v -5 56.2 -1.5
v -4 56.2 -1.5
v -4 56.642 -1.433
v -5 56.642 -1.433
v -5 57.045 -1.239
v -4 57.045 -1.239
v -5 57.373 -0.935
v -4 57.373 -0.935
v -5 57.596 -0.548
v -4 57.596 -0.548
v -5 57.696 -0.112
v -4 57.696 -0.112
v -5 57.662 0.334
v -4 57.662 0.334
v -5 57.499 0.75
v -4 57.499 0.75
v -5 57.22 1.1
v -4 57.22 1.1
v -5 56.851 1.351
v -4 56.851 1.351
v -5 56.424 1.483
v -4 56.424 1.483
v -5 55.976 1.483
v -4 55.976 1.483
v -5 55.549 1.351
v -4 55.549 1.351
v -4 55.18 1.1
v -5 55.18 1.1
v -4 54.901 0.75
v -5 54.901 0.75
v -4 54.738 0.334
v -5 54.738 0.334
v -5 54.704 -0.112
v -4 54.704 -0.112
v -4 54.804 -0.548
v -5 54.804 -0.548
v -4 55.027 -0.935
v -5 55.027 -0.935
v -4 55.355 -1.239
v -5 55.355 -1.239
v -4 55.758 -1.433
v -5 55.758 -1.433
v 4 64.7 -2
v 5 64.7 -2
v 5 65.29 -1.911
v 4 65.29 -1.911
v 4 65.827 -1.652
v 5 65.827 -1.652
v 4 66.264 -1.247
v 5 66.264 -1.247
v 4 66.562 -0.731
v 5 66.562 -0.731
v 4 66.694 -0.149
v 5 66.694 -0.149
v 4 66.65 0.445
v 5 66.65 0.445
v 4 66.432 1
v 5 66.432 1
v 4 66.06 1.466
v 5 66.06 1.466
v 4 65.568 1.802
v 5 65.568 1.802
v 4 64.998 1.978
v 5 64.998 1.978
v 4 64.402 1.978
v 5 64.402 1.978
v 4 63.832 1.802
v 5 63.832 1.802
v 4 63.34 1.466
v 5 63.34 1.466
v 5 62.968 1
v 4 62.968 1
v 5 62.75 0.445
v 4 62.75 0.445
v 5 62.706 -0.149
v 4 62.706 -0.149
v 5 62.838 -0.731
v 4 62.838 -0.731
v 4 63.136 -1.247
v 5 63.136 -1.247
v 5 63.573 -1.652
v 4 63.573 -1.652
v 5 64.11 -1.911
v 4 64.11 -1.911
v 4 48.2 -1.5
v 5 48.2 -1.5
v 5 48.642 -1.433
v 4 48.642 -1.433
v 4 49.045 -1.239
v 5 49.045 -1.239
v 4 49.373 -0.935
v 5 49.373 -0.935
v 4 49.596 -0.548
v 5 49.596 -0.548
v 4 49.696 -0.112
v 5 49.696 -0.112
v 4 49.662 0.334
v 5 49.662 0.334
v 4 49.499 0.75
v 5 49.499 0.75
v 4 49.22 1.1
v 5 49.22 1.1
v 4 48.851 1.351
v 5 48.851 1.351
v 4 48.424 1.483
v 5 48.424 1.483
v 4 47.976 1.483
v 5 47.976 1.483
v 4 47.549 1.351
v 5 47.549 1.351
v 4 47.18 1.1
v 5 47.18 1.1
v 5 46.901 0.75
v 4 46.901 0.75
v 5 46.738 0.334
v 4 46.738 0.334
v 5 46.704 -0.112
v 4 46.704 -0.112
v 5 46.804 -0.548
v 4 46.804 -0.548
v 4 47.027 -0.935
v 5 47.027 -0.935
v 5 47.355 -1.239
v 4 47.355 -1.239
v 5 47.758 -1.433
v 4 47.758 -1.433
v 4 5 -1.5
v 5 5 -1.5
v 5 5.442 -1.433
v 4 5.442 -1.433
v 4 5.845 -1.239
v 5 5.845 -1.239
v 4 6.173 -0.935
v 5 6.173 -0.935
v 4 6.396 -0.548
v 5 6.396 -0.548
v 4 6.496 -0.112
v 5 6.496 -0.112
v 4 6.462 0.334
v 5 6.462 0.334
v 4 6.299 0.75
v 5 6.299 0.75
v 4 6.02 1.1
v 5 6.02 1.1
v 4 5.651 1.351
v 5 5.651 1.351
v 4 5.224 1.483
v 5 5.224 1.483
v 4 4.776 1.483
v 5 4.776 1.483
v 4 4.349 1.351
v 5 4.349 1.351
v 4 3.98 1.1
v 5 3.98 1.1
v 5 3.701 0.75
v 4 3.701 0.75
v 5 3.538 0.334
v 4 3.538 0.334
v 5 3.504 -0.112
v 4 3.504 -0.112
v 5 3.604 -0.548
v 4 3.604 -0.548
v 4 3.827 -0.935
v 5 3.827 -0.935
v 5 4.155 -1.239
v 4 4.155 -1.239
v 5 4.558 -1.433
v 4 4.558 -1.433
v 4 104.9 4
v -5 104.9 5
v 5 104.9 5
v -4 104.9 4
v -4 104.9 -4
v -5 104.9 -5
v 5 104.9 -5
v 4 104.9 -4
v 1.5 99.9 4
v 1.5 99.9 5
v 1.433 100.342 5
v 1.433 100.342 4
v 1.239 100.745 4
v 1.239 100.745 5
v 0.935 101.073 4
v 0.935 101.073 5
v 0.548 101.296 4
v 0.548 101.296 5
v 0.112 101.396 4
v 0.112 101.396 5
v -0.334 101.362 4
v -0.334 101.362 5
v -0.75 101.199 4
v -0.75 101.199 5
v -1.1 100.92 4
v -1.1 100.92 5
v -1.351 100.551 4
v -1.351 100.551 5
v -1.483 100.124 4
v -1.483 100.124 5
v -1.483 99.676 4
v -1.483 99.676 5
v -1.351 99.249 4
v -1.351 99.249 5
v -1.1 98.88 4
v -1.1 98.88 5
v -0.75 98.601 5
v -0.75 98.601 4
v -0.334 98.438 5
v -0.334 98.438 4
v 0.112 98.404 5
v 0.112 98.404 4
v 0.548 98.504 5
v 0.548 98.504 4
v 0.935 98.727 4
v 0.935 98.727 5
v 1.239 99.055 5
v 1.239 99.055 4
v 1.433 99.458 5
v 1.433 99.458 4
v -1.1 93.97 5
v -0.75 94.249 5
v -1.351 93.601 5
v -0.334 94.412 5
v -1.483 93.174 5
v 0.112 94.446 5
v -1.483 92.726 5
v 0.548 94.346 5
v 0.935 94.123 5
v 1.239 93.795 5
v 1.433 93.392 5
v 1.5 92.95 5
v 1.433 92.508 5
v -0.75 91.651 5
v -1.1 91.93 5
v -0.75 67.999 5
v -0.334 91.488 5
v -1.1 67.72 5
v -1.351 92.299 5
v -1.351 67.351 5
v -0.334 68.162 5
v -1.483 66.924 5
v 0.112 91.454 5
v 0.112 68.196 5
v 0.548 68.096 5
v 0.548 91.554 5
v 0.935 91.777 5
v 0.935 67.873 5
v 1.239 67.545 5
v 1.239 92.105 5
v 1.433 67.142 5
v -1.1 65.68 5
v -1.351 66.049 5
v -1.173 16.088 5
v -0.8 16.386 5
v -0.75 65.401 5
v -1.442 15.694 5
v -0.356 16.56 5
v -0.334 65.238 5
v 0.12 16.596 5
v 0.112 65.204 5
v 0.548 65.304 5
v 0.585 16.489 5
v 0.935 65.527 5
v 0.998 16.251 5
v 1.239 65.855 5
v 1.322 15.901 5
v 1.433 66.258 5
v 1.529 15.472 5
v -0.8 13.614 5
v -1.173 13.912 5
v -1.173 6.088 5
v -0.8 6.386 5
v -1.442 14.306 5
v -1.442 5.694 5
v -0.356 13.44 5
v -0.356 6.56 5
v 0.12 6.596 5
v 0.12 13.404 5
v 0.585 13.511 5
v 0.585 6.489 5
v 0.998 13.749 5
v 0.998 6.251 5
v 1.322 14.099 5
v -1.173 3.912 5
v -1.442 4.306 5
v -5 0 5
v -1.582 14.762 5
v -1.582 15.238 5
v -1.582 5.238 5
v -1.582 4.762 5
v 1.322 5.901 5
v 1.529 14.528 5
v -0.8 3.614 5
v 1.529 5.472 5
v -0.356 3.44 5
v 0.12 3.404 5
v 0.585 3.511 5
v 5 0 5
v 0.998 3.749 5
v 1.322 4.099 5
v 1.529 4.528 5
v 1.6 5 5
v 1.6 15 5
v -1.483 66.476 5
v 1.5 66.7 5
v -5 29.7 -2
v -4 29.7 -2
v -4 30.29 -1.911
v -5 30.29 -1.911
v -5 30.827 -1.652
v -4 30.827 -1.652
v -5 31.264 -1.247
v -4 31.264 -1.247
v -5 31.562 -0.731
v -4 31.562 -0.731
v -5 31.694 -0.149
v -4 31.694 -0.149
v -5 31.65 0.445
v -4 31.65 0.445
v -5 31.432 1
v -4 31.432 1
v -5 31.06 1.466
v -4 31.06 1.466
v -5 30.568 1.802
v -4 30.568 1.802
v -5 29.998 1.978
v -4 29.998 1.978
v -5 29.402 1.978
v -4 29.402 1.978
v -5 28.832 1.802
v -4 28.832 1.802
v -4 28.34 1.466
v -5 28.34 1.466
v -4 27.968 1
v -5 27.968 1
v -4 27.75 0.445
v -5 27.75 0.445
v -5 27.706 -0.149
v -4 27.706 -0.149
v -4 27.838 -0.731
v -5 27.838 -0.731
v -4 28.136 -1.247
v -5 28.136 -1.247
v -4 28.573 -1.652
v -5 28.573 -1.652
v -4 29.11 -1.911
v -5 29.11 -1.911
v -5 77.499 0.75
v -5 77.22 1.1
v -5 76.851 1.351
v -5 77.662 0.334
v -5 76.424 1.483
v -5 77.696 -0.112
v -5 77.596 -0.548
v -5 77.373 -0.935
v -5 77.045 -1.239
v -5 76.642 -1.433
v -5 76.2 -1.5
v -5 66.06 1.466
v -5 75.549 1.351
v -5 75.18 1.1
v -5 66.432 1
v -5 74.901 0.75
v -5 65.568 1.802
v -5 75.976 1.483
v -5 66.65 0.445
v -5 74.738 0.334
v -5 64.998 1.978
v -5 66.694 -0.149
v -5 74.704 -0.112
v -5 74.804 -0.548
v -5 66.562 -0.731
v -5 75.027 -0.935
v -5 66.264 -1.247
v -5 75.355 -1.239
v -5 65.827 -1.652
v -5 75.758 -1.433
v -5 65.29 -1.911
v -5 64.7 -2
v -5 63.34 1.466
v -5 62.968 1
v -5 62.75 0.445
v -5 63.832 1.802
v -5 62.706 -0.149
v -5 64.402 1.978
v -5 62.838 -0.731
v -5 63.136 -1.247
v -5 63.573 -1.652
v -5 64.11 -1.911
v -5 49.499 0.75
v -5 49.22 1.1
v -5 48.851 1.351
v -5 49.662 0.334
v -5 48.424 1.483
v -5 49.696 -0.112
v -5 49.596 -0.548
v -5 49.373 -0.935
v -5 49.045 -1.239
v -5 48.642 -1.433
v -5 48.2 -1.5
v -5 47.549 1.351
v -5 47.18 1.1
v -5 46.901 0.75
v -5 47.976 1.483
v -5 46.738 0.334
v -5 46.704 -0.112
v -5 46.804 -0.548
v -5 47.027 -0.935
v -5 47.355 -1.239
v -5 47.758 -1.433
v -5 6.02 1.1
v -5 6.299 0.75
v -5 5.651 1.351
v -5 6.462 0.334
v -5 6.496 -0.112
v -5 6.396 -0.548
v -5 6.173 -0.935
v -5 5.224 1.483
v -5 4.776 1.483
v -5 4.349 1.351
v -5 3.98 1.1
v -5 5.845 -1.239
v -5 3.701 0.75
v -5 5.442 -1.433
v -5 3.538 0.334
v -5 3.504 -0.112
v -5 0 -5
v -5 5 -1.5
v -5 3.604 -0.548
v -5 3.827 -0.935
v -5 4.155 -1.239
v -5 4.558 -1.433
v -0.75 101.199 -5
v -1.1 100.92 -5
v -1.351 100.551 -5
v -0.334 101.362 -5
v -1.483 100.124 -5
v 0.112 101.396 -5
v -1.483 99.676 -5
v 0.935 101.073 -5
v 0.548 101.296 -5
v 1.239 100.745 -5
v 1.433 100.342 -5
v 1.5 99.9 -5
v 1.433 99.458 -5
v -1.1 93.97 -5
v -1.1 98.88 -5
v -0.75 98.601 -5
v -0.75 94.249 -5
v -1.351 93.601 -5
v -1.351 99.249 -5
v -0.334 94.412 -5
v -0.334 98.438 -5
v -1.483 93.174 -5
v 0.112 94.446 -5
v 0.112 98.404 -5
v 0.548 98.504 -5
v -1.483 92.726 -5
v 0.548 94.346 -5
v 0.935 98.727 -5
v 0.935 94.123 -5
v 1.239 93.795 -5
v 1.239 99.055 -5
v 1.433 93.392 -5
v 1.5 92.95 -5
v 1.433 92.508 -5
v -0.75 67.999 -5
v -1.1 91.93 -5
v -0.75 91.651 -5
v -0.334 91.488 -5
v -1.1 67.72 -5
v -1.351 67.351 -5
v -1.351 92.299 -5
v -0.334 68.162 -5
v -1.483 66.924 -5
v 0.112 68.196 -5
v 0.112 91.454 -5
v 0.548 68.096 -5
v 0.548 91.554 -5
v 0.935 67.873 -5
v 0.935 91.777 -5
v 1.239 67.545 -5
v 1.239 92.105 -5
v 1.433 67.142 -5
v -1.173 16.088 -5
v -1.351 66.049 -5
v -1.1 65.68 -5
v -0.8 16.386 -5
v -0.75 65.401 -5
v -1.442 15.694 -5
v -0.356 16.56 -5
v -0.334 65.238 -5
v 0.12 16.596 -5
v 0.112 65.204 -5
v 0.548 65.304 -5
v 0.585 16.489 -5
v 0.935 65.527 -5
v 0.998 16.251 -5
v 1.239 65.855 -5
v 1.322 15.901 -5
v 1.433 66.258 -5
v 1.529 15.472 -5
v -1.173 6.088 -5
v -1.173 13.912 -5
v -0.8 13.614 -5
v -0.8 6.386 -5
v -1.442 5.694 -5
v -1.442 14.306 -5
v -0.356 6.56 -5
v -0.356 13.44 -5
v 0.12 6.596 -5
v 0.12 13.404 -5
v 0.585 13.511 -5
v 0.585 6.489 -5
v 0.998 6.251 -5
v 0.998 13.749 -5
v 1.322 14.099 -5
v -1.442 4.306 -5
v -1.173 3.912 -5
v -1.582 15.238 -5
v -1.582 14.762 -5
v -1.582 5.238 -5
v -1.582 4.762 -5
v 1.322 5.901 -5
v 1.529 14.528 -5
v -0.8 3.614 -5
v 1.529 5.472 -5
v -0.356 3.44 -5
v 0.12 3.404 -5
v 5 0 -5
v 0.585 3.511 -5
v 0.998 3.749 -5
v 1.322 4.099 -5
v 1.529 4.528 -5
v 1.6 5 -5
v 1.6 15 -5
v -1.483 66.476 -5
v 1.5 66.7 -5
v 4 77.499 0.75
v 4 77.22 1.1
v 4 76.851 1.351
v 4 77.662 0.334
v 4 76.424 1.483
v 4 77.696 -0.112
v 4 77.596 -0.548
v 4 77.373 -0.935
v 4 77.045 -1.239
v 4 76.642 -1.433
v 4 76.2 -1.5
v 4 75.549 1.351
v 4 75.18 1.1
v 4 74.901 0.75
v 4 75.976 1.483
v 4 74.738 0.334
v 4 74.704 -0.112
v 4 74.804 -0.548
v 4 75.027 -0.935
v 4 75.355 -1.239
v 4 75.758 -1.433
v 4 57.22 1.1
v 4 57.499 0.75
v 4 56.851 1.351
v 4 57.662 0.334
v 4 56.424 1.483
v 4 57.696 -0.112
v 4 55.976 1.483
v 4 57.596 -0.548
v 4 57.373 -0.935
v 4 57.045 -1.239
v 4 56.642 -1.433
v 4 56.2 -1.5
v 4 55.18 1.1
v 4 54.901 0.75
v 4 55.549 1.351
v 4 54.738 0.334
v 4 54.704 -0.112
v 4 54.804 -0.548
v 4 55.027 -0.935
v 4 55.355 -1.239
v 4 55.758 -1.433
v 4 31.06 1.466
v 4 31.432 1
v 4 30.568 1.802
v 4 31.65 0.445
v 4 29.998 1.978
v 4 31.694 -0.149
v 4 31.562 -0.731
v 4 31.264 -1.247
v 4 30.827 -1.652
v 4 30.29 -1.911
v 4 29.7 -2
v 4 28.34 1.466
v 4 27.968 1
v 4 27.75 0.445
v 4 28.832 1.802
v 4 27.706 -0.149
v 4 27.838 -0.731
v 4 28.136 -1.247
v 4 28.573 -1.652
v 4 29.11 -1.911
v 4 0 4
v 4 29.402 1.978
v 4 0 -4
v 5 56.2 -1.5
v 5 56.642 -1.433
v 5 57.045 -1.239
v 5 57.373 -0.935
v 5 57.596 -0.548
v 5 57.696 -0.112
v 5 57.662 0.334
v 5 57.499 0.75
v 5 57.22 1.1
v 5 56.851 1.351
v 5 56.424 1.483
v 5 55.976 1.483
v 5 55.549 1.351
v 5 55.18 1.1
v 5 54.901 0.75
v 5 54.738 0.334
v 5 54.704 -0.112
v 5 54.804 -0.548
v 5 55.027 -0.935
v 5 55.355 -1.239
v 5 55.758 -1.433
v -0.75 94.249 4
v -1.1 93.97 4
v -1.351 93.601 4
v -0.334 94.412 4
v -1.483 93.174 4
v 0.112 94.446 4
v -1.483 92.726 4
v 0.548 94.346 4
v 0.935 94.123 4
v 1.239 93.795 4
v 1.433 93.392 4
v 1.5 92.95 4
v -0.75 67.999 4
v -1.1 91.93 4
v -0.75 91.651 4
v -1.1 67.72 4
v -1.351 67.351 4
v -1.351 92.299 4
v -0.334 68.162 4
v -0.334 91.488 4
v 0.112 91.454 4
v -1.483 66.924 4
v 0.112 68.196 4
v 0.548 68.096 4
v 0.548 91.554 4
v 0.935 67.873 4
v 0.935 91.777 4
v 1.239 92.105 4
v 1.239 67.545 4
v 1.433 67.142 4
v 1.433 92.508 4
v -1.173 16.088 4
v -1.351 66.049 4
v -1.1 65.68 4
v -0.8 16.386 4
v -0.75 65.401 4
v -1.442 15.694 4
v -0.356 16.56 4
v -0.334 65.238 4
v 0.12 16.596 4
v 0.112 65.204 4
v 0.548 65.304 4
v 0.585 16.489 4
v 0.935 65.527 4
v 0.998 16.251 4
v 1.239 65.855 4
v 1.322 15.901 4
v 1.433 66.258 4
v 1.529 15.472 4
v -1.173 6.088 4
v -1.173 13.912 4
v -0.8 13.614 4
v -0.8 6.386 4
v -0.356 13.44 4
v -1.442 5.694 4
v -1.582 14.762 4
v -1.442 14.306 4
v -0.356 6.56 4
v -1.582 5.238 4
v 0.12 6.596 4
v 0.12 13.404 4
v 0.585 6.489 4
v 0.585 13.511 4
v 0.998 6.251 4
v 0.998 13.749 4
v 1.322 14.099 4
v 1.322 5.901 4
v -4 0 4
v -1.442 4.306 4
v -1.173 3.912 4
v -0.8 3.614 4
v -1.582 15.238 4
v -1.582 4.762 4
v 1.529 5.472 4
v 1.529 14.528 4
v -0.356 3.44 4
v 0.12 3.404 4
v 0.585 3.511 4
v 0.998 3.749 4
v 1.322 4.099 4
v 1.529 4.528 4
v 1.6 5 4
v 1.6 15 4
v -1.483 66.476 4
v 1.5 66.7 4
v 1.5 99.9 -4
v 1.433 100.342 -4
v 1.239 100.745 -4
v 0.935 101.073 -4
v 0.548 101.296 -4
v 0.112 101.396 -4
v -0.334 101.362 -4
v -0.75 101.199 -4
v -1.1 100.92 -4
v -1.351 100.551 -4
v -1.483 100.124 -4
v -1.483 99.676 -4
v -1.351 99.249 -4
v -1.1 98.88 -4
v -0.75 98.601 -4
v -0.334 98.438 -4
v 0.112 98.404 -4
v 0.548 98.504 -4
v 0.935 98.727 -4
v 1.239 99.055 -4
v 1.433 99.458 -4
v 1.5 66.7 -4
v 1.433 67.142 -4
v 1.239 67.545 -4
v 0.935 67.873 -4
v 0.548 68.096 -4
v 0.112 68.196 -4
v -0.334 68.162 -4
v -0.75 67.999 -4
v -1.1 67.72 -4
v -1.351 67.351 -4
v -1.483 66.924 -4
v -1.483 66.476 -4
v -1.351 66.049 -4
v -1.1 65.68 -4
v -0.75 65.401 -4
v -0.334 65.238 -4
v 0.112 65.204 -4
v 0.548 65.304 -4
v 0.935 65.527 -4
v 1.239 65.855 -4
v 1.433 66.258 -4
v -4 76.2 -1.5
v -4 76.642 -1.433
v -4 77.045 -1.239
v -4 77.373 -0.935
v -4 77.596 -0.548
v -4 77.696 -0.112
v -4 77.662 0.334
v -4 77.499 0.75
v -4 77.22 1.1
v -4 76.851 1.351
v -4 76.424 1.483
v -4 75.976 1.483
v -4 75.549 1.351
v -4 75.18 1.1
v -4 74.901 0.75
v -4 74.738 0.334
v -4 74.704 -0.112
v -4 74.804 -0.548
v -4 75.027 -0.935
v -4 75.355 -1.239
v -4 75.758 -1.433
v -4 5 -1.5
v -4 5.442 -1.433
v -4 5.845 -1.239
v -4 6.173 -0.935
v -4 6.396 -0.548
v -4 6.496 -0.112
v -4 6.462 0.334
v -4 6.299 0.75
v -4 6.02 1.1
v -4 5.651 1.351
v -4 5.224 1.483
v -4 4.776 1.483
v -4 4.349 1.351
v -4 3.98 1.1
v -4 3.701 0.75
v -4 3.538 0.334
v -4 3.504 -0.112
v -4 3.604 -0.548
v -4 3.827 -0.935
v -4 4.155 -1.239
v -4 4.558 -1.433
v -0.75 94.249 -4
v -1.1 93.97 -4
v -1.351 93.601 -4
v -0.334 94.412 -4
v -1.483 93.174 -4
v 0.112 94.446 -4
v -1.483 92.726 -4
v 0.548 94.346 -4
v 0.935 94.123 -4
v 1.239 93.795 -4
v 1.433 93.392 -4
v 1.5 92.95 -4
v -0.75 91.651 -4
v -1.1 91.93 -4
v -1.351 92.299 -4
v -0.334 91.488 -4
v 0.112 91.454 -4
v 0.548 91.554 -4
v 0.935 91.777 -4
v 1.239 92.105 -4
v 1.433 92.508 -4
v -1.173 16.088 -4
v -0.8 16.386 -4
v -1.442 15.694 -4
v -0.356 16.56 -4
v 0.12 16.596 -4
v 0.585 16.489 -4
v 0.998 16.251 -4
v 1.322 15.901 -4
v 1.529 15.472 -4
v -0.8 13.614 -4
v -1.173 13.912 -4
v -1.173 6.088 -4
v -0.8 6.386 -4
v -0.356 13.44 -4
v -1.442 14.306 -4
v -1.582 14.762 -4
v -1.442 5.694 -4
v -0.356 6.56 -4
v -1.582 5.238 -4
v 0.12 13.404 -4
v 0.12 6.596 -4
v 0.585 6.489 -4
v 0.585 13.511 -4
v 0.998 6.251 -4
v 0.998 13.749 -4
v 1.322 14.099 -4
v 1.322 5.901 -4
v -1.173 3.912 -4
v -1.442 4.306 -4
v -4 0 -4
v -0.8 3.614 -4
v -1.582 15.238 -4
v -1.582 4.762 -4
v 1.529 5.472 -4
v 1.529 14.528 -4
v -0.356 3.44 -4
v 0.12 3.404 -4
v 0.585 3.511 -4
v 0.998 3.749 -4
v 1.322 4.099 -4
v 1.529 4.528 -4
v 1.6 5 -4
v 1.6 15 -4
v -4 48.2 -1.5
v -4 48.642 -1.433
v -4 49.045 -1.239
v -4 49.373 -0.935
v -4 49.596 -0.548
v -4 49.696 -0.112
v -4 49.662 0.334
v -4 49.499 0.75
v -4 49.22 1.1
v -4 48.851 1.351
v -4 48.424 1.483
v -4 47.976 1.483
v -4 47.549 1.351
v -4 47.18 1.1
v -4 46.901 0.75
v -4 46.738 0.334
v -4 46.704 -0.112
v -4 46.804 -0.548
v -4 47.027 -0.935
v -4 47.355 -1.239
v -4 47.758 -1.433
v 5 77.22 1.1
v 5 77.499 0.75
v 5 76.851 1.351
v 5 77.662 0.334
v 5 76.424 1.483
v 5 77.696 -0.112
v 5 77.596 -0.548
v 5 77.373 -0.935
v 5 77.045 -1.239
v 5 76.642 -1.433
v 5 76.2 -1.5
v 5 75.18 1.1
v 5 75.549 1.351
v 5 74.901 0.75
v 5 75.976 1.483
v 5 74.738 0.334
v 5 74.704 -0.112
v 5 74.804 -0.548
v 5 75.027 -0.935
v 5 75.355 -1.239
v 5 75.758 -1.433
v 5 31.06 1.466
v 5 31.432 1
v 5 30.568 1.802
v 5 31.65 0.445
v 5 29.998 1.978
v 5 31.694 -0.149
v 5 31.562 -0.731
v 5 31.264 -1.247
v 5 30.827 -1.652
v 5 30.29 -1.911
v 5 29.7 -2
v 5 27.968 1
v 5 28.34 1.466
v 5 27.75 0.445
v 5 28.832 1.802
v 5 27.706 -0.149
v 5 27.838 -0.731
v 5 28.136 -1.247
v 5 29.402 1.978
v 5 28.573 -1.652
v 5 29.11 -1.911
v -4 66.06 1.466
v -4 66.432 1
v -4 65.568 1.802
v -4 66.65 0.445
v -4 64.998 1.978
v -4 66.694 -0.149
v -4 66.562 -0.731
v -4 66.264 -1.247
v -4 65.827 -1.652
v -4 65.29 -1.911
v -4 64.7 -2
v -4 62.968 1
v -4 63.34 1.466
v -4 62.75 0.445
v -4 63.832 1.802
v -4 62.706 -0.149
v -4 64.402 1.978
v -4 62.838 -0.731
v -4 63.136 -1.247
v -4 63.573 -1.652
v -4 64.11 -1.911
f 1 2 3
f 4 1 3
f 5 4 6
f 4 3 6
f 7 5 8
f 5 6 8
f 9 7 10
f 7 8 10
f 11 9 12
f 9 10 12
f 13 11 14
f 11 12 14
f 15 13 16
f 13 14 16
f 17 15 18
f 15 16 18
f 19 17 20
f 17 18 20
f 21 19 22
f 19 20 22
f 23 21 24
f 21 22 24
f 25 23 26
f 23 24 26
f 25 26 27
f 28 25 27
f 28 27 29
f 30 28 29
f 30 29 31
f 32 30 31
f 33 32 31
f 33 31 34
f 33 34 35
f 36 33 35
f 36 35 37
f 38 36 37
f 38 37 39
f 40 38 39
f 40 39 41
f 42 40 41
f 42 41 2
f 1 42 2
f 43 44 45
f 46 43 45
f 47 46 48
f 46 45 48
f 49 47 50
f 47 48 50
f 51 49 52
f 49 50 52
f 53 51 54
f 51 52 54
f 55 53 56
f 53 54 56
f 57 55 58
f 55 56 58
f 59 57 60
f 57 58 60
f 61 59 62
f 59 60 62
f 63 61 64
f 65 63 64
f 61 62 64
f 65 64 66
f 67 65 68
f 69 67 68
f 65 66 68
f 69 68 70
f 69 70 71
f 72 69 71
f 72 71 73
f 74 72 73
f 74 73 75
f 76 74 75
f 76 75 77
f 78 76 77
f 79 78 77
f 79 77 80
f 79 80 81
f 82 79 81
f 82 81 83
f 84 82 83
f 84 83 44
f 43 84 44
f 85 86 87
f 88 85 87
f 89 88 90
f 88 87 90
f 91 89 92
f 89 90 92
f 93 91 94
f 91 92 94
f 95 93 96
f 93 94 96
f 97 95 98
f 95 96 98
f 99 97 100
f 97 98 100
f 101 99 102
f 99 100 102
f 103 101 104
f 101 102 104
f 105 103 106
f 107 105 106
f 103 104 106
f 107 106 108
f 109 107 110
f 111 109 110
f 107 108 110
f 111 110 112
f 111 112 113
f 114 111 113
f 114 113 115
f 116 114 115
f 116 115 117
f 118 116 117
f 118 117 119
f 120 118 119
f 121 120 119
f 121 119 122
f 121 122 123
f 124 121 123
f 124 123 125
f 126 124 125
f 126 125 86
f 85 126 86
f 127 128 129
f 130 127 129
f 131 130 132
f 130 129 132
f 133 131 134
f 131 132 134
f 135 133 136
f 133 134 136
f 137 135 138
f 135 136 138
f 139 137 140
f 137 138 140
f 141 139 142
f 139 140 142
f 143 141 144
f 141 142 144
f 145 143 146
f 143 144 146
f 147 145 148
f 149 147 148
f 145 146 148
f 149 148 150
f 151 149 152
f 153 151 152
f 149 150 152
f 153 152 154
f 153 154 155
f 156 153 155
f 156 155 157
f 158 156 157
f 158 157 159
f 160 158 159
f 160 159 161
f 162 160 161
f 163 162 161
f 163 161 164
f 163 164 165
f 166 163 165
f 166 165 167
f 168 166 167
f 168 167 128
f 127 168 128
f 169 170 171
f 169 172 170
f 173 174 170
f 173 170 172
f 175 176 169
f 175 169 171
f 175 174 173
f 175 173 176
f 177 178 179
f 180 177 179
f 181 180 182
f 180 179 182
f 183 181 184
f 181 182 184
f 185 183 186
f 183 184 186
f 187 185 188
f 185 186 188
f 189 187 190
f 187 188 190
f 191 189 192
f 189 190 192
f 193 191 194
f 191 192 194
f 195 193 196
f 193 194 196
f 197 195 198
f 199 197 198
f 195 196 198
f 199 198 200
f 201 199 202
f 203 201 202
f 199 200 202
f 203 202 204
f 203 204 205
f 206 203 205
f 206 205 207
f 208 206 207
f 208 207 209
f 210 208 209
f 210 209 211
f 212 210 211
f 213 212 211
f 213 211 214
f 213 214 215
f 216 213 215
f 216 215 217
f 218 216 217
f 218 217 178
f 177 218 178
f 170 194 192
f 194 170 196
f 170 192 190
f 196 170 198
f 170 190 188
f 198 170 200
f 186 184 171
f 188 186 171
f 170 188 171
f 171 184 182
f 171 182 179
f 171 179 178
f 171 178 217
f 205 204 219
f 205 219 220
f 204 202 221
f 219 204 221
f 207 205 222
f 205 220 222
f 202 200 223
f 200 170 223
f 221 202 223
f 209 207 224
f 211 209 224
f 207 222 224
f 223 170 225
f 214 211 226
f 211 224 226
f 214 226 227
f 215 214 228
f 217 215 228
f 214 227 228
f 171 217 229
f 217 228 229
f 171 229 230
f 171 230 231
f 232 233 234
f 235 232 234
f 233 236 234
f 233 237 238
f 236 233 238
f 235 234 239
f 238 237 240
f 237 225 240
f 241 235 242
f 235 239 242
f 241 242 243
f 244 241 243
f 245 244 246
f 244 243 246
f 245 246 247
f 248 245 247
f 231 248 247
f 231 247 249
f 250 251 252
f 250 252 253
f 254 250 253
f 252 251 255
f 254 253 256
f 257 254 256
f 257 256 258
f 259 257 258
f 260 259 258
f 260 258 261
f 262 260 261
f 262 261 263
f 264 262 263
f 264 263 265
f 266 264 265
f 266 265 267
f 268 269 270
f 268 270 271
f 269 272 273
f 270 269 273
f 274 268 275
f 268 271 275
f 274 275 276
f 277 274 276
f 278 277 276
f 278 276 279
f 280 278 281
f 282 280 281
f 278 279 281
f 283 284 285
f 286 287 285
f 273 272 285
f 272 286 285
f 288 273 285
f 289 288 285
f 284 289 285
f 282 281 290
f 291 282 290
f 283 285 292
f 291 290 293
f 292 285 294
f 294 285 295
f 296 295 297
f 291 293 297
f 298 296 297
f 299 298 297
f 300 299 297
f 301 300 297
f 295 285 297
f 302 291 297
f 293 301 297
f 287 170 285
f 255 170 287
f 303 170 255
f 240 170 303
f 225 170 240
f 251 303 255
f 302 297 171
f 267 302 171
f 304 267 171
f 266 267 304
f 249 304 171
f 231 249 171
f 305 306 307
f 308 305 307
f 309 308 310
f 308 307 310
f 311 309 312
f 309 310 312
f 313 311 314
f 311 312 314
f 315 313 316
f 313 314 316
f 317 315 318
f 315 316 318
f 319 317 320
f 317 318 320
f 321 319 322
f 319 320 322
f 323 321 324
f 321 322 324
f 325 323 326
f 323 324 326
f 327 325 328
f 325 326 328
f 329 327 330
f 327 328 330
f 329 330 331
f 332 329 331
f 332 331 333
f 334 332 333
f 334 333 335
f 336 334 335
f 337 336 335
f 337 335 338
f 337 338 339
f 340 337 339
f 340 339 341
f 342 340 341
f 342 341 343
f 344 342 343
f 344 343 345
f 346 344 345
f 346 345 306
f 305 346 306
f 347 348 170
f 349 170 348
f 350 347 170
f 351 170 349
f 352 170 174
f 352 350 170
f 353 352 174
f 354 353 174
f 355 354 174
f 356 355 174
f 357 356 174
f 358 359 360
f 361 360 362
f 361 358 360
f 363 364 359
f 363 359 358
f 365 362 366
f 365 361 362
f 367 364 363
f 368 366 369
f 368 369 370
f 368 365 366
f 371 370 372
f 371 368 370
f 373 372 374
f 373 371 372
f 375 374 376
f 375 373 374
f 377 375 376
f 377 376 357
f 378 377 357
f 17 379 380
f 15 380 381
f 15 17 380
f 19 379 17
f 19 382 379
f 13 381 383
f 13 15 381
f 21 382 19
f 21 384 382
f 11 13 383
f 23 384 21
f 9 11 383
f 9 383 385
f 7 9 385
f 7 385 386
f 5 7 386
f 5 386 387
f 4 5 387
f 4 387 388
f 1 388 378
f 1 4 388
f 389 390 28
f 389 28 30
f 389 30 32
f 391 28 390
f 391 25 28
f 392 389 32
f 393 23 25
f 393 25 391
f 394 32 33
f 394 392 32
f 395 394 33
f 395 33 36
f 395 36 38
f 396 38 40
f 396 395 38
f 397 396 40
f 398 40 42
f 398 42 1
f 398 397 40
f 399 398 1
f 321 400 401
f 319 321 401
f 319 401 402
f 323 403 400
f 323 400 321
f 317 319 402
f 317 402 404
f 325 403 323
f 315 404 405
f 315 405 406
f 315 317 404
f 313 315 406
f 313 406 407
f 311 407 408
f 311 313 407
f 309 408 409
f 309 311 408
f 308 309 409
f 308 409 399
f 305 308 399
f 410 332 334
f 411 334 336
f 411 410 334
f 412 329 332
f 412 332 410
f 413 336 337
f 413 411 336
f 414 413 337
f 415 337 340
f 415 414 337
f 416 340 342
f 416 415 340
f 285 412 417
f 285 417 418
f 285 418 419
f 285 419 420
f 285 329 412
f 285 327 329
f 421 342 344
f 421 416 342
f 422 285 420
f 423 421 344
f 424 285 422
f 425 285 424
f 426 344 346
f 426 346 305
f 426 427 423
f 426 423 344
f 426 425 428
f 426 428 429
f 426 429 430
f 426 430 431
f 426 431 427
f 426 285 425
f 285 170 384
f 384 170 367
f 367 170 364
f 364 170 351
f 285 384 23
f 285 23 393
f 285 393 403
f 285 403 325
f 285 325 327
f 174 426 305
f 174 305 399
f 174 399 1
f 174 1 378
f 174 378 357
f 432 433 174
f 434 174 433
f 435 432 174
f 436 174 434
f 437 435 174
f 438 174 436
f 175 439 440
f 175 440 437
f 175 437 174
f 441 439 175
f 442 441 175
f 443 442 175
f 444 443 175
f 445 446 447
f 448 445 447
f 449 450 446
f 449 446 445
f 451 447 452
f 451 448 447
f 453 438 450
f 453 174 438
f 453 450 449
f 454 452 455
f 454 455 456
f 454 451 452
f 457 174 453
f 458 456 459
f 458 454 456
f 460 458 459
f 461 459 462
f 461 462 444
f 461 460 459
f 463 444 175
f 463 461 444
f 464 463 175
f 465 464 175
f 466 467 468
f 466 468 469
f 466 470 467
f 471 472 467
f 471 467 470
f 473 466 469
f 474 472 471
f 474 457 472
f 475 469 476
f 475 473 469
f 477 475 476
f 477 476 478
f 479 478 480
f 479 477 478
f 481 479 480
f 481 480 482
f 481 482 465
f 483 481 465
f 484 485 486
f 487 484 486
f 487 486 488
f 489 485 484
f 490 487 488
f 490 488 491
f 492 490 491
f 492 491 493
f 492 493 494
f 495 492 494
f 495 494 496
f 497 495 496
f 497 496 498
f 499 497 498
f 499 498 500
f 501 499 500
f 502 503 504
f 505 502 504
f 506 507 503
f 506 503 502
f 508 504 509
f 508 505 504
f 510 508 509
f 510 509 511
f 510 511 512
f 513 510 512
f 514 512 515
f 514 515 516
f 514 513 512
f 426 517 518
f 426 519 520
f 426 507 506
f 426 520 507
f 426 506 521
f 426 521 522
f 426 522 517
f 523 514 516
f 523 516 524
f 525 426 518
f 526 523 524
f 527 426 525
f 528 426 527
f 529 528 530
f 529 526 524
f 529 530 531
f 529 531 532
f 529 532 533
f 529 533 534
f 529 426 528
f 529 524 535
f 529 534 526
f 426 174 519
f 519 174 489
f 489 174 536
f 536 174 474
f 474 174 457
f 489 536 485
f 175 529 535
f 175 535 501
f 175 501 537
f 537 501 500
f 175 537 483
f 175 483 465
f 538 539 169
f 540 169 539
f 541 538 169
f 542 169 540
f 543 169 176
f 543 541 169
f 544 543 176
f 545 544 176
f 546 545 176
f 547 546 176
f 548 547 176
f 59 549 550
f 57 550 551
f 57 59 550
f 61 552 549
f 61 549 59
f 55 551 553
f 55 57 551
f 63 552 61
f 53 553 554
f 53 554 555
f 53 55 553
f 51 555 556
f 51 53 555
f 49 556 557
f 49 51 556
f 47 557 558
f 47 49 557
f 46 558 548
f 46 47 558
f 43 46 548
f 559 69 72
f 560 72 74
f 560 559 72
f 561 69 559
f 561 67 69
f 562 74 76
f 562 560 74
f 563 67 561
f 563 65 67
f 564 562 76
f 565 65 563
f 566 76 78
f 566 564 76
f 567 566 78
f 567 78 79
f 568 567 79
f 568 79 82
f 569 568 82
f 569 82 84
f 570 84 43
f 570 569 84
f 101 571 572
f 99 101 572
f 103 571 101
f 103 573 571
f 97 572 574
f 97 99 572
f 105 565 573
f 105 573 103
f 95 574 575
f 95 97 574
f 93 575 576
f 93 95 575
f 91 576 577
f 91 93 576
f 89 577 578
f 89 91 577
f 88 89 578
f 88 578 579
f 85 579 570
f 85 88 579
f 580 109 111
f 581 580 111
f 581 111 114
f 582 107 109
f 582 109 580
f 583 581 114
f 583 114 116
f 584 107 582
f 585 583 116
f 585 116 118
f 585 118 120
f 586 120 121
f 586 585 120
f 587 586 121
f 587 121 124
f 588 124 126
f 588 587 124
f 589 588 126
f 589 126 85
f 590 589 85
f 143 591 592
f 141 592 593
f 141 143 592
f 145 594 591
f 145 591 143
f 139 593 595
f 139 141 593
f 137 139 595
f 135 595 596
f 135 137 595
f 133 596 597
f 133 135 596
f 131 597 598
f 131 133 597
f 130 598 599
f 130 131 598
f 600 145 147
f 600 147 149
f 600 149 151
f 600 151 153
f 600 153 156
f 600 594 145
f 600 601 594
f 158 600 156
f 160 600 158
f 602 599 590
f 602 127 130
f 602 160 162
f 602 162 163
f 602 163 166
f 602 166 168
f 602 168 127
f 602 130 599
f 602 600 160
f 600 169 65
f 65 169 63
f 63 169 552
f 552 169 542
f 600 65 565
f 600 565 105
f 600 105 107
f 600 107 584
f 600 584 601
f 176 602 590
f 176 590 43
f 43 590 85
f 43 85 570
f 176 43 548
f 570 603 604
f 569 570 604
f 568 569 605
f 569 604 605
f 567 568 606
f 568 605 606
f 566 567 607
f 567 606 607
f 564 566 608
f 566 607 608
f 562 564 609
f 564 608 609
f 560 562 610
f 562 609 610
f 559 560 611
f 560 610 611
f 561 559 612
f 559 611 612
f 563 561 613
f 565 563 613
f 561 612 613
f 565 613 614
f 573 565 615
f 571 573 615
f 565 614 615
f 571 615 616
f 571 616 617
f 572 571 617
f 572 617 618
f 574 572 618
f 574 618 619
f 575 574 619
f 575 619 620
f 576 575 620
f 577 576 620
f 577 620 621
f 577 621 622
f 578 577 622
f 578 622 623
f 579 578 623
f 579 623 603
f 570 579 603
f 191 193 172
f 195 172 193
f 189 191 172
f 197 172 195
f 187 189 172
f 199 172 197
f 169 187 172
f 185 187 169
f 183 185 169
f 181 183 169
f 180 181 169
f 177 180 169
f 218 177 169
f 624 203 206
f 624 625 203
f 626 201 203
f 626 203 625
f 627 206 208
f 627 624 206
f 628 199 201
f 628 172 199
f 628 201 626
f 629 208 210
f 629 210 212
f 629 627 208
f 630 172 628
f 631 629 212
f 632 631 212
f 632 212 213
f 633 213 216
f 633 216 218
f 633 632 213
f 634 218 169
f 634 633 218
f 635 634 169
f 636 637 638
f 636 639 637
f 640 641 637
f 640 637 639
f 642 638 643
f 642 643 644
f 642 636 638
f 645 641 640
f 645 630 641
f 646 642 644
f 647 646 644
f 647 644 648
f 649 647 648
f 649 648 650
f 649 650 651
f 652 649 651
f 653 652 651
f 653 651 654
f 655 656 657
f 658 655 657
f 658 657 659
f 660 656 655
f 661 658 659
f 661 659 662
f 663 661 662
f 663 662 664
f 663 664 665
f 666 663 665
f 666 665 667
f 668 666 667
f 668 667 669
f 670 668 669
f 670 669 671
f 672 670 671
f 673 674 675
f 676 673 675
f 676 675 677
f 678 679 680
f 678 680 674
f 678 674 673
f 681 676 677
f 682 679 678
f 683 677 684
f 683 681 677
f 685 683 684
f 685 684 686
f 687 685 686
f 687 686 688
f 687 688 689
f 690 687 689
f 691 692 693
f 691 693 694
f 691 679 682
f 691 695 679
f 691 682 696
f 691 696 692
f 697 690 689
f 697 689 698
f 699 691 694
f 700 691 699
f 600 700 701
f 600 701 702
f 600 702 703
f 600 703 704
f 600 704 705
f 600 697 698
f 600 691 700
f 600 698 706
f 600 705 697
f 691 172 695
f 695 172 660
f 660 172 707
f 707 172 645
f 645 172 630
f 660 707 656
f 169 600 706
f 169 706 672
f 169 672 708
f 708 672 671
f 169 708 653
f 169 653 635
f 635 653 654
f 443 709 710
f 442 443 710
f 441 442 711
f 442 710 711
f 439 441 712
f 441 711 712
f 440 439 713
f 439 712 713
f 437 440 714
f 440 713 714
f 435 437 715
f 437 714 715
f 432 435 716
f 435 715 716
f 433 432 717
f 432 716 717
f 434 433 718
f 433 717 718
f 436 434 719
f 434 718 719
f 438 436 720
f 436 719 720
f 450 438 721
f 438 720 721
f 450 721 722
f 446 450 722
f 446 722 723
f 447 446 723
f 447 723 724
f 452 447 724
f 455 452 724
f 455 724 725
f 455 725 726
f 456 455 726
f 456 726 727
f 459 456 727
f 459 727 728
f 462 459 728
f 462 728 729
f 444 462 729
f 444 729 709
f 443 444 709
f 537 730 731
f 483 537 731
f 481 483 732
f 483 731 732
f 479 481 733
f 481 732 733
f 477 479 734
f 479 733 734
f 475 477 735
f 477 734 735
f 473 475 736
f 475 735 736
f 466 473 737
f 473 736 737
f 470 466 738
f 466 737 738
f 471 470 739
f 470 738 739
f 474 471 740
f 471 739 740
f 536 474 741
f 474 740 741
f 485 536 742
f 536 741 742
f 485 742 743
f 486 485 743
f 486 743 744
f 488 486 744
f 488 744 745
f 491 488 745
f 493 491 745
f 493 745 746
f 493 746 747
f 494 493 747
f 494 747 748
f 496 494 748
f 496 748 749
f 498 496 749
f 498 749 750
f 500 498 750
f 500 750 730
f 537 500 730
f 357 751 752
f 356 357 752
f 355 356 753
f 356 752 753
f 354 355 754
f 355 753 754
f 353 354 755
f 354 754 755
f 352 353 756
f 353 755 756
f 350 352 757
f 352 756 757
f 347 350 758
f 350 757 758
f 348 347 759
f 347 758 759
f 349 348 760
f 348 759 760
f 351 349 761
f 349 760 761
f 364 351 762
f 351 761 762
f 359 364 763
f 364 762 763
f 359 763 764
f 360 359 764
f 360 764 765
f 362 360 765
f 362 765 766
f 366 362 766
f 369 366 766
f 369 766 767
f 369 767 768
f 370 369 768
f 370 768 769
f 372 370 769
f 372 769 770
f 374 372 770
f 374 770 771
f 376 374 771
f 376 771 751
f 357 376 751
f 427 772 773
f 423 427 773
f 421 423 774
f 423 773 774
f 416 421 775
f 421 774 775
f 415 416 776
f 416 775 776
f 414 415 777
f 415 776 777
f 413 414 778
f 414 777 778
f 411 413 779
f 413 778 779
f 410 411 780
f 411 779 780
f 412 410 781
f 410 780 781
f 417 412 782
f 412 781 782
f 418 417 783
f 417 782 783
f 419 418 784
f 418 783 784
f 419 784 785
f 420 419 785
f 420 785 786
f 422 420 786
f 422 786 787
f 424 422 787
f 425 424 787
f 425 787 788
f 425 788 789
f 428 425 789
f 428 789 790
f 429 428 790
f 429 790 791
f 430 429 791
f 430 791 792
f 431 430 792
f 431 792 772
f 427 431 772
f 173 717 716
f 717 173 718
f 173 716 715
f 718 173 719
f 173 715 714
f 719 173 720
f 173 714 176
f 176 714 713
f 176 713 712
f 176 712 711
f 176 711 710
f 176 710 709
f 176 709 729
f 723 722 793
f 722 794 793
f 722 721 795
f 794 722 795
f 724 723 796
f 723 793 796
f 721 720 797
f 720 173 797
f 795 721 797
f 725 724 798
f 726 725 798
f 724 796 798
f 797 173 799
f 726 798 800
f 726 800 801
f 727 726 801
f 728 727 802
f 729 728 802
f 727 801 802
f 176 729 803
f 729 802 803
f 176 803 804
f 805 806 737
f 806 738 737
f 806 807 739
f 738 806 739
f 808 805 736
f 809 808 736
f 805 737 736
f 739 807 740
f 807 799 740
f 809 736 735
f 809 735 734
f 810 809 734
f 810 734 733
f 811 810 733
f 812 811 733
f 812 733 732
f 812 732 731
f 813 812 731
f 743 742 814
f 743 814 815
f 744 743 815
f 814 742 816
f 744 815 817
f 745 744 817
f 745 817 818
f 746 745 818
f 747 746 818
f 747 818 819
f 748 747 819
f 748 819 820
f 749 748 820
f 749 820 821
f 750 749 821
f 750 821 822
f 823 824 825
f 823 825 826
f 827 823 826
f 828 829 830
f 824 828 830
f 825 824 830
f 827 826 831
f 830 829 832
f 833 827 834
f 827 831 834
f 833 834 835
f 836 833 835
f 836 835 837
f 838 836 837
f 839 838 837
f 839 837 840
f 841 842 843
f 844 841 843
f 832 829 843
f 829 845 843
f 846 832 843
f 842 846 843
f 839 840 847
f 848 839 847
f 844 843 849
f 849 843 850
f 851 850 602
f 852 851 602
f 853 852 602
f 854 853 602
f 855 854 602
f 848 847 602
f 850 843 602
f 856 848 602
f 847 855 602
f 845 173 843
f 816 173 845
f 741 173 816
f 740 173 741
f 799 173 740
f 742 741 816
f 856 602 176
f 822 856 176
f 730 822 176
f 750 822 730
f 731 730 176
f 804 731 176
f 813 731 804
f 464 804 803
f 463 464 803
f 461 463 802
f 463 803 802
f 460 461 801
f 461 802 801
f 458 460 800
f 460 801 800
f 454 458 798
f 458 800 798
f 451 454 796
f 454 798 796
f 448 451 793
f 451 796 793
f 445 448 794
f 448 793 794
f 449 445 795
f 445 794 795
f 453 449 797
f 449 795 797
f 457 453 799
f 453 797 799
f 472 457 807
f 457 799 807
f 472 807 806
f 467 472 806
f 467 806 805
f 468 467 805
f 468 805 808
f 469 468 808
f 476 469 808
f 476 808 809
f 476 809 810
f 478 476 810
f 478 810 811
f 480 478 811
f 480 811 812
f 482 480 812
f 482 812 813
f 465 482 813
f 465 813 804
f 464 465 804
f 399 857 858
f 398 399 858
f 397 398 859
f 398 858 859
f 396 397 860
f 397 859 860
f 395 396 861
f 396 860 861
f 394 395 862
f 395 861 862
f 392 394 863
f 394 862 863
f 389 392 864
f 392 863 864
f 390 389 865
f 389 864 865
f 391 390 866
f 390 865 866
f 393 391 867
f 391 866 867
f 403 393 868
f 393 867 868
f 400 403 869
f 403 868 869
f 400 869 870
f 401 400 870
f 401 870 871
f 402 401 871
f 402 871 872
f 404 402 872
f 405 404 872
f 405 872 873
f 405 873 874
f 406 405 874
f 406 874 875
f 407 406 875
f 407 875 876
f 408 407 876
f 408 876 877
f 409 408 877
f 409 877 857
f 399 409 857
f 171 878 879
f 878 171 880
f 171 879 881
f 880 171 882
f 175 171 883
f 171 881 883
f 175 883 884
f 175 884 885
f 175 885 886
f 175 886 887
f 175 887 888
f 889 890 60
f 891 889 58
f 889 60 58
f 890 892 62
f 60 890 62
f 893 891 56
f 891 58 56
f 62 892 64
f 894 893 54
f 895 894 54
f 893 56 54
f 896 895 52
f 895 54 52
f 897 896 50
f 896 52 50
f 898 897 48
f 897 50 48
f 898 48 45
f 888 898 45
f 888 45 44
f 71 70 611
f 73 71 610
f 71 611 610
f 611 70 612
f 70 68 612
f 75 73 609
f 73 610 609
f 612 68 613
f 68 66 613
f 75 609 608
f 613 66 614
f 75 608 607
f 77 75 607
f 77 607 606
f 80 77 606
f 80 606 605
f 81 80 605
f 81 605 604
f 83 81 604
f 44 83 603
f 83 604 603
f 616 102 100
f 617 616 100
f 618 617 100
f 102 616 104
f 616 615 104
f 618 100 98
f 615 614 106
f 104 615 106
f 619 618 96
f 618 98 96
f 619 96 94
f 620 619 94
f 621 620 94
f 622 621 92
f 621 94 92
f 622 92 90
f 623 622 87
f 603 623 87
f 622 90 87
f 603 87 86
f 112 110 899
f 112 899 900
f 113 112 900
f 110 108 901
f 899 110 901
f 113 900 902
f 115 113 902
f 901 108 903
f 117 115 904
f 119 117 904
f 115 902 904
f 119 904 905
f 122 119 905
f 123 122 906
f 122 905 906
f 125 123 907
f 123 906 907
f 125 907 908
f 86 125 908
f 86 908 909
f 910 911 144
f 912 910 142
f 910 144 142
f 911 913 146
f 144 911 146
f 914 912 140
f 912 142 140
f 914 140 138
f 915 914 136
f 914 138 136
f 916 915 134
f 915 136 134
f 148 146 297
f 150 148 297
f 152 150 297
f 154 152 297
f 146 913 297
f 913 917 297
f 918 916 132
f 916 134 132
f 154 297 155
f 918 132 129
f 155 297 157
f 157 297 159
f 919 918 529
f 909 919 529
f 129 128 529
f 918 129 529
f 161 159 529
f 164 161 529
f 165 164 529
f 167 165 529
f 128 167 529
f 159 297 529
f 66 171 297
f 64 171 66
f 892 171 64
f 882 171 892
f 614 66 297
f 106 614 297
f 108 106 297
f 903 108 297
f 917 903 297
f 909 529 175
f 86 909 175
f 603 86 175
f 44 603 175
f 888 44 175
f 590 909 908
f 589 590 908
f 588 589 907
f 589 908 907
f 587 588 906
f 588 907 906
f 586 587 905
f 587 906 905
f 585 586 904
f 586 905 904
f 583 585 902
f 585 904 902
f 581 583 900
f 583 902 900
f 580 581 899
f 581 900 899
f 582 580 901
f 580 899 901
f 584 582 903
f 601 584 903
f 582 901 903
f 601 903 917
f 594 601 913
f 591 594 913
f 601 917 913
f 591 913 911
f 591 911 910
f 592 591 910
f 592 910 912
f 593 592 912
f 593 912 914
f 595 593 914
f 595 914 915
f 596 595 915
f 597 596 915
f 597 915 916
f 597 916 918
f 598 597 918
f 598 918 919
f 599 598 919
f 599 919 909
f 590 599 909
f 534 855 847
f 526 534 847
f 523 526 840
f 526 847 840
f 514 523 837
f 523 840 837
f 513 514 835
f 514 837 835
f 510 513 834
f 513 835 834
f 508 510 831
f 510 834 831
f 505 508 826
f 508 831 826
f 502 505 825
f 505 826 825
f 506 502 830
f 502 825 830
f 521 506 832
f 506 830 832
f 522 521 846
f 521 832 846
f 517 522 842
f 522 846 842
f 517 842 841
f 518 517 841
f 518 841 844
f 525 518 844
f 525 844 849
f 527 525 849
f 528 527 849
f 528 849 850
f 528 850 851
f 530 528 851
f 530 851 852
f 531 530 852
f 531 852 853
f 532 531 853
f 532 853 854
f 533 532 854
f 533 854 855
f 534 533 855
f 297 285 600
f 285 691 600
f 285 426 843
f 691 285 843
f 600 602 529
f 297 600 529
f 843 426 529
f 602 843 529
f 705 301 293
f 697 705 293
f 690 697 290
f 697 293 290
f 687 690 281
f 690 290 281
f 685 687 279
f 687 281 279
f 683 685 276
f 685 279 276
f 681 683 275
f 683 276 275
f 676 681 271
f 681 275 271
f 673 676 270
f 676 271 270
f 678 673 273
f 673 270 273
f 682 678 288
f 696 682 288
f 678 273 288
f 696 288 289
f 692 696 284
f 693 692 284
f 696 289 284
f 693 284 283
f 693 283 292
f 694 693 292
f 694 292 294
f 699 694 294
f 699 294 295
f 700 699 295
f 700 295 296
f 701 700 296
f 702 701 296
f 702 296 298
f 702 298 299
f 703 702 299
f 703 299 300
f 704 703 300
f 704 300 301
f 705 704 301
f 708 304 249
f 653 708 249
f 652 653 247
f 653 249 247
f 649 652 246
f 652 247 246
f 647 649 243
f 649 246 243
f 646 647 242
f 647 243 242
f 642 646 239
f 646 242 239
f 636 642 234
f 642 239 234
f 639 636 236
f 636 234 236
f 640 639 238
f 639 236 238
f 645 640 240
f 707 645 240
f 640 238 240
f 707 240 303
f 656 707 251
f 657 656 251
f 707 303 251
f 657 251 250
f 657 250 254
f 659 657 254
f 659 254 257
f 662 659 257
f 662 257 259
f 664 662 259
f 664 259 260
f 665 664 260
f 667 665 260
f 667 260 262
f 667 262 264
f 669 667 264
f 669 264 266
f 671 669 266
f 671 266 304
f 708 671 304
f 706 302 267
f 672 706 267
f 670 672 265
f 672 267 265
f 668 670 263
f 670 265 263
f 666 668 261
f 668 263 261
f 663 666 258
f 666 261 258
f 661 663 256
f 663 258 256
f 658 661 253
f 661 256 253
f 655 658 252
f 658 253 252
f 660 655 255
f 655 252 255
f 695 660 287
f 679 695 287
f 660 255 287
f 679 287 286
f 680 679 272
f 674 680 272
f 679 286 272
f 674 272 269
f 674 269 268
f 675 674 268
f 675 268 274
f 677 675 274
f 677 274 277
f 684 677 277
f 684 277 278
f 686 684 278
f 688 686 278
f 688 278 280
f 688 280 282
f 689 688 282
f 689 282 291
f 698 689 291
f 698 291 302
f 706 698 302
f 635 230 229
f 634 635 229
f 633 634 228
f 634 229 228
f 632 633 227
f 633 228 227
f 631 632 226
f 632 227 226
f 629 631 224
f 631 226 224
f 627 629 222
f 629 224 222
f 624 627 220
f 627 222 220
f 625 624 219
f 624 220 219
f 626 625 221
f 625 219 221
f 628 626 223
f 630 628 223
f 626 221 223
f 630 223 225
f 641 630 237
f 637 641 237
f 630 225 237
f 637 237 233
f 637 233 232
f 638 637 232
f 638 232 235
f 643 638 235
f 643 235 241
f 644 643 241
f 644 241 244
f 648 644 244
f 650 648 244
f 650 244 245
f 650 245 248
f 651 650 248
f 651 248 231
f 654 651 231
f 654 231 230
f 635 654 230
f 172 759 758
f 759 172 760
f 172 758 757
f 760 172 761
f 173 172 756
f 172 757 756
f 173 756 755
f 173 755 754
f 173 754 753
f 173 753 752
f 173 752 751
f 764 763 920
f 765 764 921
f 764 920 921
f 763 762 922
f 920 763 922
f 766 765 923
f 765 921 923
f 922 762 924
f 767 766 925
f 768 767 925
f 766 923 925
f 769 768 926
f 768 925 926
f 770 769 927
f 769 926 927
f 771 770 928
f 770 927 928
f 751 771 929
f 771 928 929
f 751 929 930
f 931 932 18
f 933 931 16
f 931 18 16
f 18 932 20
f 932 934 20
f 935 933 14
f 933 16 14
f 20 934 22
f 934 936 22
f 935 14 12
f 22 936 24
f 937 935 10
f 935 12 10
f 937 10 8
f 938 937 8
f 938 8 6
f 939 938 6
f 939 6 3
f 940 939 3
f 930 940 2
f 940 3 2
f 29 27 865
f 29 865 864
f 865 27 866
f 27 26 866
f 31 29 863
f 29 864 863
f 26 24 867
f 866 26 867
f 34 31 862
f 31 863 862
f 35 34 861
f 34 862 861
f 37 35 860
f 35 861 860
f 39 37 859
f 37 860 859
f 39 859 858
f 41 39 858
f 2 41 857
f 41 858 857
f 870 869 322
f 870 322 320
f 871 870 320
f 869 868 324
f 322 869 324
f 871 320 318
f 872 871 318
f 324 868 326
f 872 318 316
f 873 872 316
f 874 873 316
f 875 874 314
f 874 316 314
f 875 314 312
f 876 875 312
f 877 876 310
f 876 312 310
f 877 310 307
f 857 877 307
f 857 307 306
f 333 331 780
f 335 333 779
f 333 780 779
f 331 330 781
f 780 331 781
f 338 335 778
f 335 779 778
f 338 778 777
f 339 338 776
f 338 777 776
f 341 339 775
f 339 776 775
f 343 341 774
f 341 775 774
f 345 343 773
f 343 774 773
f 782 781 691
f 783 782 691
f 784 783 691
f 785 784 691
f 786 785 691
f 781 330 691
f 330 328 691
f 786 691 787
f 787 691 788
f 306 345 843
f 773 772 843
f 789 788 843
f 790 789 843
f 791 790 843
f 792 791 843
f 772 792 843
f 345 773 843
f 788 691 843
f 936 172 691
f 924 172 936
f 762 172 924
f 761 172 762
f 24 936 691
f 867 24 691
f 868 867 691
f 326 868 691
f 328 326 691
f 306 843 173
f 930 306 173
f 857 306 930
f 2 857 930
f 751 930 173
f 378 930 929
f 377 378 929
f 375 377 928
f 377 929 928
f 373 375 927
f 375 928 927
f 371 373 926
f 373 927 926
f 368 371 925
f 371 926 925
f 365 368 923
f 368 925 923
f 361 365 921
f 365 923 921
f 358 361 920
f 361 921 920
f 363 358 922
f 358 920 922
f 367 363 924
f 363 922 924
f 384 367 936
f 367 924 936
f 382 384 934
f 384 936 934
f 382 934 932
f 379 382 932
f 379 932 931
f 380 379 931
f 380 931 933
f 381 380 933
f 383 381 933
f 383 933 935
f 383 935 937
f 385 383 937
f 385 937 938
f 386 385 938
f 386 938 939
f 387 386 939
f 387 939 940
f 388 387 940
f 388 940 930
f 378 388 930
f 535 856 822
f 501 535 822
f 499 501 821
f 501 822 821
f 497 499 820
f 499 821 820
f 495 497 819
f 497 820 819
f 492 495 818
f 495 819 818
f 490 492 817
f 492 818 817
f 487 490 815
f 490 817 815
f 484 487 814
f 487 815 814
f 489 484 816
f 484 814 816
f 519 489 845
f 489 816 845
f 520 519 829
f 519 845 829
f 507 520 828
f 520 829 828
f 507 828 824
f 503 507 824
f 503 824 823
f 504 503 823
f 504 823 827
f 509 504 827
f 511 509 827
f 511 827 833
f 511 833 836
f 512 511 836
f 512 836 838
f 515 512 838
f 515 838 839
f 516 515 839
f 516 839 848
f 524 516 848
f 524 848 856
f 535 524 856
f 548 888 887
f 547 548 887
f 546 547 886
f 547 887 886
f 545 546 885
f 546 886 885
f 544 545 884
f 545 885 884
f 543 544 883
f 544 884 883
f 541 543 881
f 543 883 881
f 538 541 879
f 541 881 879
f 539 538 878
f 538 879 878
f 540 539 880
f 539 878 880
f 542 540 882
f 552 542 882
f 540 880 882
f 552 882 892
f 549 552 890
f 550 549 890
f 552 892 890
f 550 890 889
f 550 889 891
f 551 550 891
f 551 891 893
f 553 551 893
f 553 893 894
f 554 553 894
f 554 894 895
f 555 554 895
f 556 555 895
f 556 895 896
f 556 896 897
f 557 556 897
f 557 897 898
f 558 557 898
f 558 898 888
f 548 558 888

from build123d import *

# Parameters (mm, degrees)
SKETCH_1_W          = 10
SKETCH_1_H          = 10
SKETCH_1_W_2        = 8
SKETCH_1_H_2        = 8
EXTRUDE_1_DEPTH     = 104.9
SKETCH_2_R          = 1.6
SKETCH_2_R_2        = 1.5
CUT_EXTRUDE_1_DEPTH = 106.494123059
SKETCH_3_R          = 1.5
SKETCH_3_R_2        = 2
CUT_EXTRUDE_2_DEPTH = 106.494123059


with BuildPart() as part:
    # ｽｹｯﾁ1 → 押し出し-薄板1 (new body)
    with BuildSketch(Plane(origin=(0, 0, 0), x_dir=(1, 0, 0), z_dir=(0, 1, 0))):
        Rectangle(SKETCH_1_W, SKETCH_1_H)
        Rectangle(SKETCH_1_W_2, SKETCH_1_H_2, mode=Mode.SUBTRACT)
    extrude(amount=EXTRUDE_1_DEPTH)

    # ｽｹｯﾁ2 → ｶｯﾄ - 押し出し1 (cut, through all)
    with BuildSketch(Plane.XY.offset(5)):
        with Locations((0, 5)):
            Circle(SKETCH_2_R)
        with Locations((0, 15)):
            Circle(SKETCH_2_R)
        with Locations((0, 92.95)):
            Circle(SKETCH_2_R_2)
        with Locations((0, 66.7)):
            Circle(SKETCH_2_R_2)
        with Locations((0, 99.9)):
            Circle(SKETCH_2_R_2)
    extrude(amount=-CUT_EXTRUDE_1_DEPTH, mode=Mode.SUBTRACT)

    # ｽｹｯﾁ3 → ｶｯﾄ - 押し出し2 (cut, through all)
    with BuildSketch(Plane(origin=(5, 0, 0), x_dir=(0, 0, -1), z_dir=(1, 0, 0))):
        with Locations((0, 76.2)):
            Circle(SKETCH_3_R)
        with Locations((0, 5)):
            Circle(SKETCH_3_R)
        with Locations((0, 64.7)):
            Circle(SKETCH_3_R_2)
        with Locations((0, 29.7)):
            Circle(SKETCH_3_R_2)
        with Locations((0, 48.2)):
            Circle(SKETCH_3_R)
        with Locations((0, 56.2)):
            Circle(SKETCH_3_R)
    extrude(amount=-CUT_EXTRUDE_2_DEPTH, mode=Mode.SUBTRACT)


solid = part.part
